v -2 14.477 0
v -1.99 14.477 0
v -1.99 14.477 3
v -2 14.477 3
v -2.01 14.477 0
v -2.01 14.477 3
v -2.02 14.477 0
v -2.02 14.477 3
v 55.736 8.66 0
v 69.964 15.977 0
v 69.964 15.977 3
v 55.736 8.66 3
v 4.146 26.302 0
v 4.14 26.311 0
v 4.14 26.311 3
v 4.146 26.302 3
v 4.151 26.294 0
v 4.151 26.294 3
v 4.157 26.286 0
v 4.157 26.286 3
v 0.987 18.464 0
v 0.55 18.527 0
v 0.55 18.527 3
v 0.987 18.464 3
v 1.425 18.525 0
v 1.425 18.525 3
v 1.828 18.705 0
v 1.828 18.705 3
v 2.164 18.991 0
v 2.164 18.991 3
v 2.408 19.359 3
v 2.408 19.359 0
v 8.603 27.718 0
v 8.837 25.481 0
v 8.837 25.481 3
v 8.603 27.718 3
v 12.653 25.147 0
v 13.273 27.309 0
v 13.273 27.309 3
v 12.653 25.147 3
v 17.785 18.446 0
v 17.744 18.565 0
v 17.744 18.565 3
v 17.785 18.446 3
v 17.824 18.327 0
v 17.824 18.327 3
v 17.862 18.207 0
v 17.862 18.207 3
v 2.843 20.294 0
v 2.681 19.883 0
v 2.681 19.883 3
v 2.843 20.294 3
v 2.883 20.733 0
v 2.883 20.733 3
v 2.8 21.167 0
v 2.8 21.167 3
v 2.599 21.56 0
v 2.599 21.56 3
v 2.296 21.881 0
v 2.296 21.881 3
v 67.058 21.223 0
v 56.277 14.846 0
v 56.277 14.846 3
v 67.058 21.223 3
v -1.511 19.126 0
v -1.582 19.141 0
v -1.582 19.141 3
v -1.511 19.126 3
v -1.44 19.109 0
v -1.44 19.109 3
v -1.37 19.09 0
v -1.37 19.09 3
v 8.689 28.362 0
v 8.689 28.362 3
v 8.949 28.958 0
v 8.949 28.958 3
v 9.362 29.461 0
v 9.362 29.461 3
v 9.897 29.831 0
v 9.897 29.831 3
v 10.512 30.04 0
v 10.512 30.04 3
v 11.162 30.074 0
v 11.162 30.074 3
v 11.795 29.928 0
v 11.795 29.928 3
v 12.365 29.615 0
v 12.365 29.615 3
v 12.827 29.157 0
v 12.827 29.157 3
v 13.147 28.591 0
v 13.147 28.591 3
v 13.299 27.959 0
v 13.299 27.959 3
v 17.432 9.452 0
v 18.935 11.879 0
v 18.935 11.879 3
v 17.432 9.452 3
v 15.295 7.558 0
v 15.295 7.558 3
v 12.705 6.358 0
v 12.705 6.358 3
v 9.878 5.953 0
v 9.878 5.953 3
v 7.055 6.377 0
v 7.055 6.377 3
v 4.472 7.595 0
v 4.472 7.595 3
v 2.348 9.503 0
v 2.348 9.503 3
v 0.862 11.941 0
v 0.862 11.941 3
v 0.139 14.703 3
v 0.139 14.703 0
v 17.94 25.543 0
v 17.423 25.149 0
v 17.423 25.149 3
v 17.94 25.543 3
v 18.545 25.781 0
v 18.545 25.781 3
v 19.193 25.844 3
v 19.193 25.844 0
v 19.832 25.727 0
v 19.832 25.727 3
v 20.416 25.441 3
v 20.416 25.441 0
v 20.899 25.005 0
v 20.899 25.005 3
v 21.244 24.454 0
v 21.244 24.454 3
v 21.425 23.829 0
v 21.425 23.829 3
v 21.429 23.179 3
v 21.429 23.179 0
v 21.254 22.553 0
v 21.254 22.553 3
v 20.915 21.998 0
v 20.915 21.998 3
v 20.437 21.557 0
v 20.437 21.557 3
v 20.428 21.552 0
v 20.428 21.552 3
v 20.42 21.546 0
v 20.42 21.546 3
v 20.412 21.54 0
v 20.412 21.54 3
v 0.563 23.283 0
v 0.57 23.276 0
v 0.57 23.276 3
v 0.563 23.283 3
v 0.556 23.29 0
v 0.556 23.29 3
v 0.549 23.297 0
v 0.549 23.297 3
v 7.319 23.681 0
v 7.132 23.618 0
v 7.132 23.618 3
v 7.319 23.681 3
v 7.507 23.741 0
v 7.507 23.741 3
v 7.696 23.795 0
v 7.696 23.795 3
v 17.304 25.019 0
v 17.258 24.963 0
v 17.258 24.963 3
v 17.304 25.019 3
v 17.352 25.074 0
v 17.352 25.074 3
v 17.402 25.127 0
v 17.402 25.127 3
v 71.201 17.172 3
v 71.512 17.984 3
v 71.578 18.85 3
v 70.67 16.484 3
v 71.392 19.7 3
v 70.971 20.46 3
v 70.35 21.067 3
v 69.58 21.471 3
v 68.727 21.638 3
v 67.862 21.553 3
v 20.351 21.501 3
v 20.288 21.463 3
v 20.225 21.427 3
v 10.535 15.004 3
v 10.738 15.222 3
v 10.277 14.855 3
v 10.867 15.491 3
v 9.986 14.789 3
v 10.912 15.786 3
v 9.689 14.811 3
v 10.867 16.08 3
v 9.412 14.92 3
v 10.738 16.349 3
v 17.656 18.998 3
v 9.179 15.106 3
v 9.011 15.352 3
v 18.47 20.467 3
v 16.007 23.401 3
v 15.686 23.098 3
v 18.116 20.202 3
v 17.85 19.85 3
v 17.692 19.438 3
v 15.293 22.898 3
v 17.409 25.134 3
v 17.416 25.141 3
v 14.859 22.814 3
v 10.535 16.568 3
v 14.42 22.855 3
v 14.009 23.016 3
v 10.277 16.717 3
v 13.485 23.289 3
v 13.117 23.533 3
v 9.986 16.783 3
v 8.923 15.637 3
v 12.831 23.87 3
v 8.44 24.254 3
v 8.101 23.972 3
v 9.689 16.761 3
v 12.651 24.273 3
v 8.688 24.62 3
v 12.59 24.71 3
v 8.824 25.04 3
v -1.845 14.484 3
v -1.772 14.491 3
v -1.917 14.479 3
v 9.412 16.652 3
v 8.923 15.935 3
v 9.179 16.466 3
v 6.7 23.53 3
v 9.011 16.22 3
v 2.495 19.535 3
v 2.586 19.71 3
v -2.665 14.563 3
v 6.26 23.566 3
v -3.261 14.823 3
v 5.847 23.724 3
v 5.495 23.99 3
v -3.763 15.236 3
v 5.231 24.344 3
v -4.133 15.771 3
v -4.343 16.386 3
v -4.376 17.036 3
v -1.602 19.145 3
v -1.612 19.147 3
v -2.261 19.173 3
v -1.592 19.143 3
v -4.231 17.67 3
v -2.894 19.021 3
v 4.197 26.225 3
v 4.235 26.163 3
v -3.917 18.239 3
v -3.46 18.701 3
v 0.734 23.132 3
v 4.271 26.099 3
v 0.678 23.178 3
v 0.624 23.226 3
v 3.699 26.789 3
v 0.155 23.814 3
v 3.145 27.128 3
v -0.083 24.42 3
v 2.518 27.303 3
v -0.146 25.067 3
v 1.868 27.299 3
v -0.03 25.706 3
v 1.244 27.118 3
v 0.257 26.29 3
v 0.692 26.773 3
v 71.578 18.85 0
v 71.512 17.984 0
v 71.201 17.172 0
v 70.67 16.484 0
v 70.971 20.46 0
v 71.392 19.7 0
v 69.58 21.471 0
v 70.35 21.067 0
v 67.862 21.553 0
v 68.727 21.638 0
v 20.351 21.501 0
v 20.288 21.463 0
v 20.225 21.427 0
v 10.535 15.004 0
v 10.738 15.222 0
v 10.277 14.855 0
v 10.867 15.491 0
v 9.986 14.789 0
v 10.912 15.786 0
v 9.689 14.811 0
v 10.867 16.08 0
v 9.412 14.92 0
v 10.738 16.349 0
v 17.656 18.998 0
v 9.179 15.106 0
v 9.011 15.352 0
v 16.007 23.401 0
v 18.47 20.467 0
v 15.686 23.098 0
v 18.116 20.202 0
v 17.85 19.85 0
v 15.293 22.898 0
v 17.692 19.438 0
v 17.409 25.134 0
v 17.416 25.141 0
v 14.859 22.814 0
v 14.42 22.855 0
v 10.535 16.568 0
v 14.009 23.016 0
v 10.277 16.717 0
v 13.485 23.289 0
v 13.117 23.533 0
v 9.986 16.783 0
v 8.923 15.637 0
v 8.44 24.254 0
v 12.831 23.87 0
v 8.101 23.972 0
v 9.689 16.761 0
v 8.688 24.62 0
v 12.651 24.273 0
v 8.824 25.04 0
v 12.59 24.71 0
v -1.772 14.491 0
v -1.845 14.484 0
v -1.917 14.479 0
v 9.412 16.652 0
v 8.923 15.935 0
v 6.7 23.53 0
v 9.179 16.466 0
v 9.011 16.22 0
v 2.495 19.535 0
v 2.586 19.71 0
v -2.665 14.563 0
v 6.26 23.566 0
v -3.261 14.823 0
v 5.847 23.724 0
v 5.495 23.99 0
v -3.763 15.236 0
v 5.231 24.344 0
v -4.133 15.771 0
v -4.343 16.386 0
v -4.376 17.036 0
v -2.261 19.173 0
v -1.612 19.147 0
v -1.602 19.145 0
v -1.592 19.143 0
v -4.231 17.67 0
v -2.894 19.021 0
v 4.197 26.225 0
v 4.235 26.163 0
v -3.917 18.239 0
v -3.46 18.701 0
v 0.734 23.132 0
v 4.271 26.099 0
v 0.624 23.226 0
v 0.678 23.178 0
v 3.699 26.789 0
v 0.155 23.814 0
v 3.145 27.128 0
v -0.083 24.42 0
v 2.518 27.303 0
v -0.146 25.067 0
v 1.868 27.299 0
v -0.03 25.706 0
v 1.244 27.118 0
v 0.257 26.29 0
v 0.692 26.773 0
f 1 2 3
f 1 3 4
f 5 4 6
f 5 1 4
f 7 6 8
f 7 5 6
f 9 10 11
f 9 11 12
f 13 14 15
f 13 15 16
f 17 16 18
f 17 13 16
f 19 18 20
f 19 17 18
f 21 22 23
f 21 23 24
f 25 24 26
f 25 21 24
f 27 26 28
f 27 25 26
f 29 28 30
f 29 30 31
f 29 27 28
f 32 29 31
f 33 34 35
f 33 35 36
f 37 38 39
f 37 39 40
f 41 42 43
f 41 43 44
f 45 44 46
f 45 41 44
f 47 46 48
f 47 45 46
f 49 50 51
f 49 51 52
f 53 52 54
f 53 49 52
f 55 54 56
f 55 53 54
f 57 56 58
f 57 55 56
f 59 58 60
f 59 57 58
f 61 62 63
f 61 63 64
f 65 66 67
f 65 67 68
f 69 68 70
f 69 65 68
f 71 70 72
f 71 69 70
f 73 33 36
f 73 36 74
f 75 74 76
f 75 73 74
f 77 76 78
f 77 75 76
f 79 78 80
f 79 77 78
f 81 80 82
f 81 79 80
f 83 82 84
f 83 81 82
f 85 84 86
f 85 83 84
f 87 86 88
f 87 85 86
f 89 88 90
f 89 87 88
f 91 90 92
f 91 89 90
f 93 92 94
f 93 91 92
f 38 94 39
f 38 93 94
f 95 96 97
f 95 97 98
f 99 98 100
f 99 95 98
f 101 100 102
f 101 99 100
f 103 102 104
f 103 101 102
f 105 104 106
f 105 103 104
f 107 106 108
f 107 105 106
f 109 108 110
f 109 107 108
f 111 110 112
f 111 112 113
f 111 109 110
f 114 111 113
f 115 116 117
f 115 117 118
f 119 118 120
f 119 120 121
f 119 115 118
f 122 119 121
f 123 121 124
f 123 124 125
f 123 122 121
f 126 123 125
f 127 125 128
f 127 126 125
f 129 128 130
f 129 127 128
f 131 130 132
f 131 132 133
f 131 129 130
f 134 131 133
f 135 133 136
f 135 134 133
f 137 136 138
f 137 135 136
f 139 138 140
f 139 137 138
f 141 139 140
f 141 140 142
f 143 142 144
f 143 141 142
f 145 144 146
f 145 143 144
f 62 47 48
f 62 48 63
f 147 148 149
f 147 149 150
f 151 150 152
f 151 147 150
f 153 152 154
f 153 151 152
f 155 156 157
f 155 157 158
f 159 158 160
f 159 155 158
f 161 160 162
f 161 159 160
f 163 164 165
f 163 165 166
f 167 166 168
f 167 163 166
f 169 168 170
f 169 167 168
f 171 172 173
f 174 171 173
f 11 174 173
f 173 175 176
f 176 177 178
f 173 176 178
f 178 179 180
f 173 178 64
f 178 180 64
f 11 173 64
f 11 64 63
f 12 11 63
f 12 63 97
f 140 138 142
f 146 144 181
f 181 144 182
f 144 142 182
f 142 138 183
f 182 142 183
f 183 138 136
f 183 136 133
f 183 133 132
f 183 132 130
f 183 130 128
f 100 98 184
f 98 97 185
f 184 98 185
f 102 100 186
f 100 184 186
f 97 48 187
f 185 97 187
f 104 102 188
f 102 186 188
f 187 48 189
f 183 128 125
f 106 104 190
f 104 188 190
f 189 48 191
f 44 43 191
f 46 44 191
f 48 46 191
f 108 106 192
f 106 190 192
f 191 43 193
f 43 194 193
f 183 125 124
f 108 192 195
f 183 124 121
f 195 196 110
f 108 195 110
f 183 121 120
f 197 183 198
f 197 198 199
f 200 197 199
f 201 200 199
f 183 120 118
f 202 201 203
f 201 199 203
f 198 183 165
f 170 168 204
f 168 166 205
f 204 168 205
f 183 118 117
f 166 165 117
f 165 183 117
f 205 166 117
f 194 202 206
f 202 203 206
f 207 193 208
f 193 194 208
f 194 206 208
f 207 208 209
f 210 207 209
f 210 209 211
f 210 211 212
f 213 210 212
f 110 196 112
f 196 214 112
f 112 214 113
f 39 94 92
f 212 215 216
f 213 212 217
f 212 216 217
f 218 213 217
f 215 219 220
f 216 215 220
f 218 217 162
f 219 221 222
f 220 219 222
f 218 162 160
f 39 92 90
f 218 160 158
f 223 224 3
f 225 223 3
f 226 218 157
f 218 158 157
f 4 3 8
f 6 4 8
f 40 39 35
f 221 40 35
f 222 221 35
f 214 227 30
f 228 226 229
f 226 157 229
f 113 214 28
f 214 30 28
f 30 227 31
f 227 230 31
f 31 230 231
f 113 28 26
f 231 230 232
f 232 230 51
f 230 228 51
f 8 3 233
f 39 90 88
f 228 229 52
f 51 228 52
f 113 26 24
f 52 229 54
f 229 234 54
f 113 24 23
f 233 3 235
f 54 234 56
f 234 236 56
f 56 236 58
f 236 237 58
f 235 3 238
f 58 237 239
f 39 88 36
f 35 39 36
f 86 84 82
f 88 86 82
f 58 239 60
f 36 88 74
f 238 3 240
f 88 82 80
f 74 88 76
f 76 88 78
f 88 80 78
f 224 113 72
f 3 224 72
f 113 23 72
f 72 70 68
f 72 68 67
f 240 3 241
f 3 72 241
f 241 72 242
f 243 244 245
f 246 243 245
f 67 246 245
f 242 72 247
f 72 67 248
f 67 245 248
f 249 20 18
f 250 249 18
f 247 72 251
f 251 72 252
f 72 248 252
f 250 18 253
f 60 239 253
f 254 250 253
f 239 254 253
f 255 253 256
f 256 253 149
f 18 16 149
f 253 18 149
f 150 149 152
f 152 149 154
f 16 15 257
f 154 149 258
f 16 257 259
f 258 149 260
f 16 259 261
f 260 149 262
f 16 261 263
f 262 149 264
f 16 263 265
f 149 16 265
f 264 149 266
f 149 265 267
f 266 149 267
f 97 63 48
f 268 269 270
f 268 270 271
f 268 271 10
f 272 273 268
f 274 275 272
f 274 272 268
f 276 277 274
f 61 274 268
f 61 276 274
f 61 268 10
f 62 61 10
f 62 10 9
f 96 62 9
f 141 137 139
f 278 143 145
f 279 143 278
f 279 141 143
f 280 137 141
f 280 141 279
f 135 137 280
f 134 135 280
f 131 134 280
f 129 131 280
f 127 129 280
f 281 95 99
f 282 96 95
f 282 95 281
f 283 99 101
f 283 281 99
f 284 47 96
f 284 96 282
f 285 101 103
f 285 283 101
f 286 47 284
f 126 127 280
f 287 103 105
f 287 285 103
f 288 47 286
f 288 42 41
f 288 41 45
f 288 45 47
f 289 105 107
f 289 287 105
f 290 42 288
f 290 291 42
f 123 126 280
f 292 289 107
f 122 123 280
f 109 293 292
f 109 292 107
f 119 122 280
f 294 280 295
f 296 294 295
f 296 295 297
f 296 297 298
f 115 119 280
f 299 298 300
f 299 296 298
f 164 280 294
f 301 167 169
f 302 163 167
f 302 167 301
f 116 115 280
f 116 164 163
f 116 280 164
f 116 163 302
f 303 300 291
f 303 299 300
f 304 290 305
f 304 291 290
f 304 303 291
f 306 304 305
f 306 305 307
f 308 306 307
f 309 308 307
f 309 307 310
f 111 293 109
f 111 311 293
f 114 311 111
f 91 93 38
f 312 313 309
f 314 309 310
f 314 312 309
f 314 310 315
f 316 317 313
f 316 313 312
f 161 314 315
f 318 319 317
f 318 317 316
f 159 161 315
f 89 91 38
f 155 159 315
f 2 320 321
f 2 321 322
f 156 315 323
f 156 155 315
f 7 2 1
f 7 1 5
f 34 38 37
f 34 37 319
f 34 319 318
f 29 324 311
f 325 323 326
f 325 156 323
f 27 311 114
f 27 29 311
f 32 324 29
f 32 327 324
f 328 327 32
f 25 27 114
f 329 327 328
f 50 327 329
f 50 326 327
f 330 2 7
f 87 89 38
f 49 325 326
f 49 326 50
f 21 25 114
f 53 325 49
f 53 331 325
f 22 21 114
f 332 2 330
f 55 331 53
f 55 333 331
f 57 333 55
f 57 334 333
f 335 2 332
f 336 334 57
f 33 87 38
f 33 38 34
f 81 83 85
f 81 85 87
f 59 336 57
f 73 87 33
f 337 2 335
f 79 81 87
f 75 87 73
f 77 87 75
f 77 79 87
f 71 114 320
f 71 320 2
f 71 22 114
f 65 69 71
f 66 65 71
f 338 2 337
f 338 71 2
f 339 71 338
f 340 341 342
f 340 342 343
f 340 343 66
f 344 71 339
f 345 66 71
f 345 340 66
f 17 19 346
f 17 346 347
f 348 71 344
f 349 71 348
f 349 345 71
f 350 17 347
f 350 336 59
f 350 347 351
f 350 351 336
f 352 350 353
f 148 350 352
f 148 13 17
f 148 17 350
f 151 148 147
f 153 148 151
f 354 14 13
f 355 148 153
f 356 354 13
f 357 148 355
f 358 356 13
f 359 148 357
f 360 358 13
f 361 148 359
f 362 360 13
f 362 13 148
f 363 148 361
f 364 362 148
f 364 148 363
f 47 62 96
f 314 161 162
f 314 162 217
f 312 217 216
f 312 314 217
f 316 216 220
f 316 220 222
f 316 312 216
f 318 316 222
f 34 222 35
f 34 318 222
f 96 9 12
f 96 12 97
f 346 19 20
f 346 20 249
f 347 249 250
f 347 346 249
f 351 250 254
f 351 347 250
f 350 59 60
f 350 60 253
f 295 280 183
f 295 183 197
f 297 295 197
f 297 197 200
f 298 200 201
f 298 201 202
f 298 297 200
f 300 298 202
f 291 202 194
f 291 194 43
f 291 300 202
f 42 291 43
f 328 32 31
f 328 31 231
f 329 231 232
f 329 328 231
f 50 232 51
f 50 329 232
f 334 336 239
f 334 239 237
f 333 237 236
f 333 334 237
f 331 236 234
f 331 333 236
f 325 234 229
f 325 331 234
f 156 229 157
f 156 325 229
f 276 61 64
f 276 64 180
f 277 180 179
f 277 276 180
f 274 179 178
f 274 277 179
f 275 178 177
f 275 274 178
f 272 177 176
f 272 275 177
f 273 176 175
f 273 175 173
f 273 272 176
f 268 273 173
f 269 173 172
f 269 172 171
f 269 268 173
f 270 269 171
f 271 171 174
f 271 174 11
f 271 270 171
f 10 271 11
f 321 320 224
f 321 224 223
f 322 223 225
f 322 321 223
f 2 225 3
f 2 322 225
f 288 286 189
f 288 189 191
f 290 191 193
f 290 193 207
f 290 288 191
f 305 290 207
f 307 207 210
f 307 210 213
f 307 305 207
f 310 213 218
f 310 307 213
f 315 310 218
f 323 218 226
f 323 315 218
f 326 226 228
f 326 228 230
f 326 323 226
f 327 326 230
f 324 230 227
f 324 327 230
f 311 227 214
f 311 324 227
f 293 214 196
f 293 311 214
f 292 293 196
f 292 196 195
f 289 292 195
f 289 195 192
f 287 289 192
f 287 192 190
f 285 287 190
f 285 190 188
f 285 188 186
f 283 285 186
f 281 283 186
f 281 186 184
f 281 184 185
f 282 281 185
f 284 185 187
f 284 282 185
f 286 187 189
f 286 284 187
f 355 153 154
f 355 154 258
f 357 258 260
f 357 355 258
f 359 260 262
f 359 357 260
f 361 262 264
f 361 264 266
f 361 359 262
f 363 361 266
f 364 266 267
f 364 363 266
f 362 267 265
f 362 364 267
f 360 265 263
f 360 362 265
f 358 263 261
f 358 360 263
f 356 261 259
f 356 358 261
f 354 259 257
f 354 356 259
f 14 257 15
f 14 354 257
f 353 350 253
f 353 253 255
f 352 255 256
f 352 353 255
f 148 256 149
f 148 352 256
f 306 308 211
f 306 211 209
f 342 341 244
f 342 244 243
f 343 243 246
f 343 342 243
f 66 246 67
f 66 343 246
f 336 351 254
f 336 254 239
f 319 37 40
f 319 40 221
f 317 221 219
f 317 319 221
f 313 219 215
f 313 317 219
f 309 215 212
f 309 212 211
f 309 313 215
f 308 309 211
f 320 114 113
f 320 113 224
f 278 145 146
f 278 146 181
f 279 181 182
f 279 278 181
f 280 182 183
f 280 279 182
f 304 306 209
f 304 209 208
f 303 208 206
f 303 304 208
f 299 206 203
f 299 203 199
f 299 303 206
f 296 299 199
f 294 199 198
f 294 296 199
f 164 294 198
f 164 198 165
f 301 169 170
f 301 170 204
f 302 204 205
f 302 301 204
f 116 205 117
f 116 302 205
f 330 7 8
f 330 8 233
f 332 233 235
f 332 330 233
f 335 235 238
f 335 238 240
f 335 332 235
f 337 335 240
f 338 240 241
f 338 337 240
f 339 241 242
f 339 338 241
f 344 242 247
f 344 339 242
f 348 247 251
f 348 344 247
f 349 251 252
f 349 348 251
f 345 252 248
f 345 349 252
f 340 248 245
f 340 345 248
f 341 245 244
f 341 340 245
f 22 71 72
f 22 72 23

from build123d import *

# Parameters (mm, degrees)
MODEL_R                 = 1
SALIENTE_EXTRUIR1_DEPTH = 3


with BuildPart() as part:
    # Model → Saliente-Extruir1 (new body)
    with BuildSketch(Plane.XY):
        with BuildLine():
            Line((17.861622063, 18.20706488), (56.277425925, 14.846117598))
            Line((56.277425925, 14.846117598), (67.057874252, 21.223257456))
            ThreePointArc((67.057874252, 21.223257456), (71.209474737, 20.095027087), (69.964368376, 15.976969231))
            Line((69.964368376, 15.976969231), (55.736188762, 8.659748523))
            Line((55.736188762, 8.659748523), (18.934882774, 11.8794456))
            ThreePointArc((18.934882774, 11.8794456), (8.451096418, 6.06231898), (0.138961898, 14.702756365))
            Line((0.138961898, 14.702756365), (-1.772059081, 14.490982222))
            ThreePointArc((-1.772059081, 14.490982222), (-1.880981546, 14.481466547), (-1.990228383, 14.477019049))
            ThreePointArc((-1.990228383, 14.477019049), (-2.005285406, 14.476804272), (-2.020343495, 14.476685822))
            ThreePointArc((-2.020343495, 14.476685822), (-4.376324998, 17.035772608), (-1.611755391, 19.146869222))
            ThreePointArc((-1.611755391, 19.146869222), (-1.596946637, 19.144137761), (-1.582155659, 19.141311623))
            ThreePointArc((-1.582155659, 19.141311623), (-1.475340827, 19.117961178), (-1.369725519, 19.08967588))
            Line((-1.369725519, 19.08967588), (0.550429384, 18.527326068))
            ThreePointArc((0.550429384, 18.527326068), (1.632460158, 18.600931479), (2.408362946, 19.35868026))
            ThreePointArc((2.408362946, 19.35868026), (2.540100184, 19.623117729), (2.6811533, 19.882705658))
            ThreePointArc((2.6811533, 19.882705658), (2.856825208, 20.952914859), (2.296491875, 21.881480908))
            Line((2.296491875, 21.881480908), (0.734486272, 23.131829117))
            ThreePointArc((0.734486272, 23.131829117), (0.65073786, 23.202120333), (0.570343825, 23.276224656))
            ThreePointArc((0.570343825, 23.276224656), (0.559545032, 23.286719709), (0.548813598, 23.297283629))
            ThreePointArc((0.548813598, 23.297283629), (0.692430721, 26.772761747), (4.140047368, 26.310686561))
            ThreePointArc((4.140047368, 26.310686561), (4.148587304, 26.298283756), (4.157047724, 26.285826574))
            ThreePointArc((4.157047724, 26.285826574), (4.216065957, 26.193785825), (4.270746533, 26.099103798))
            Line((4.270746533, 26.099103798), (5.230859716, 24.343707882))
            ThreePointArc((5.230859716, 24.343707882), (6.048017899, 23.630643468), (7.132473325, 23.617806645))
            ThreePointArc((7.132473325, 23.617806645), (7.412611146, 23.711639877), (7.695907146, 23.795456646))
            ThreePointArc((7.695907146, 23.795456646), (8.576878126, 24.427990033), (8.837257977, 25.480800883))
            Line((8.837257977, 25.480800883), (8.602586519, 27.717719751))
            ThreePointArc((8.602586519, 27.717719751), (11.161673306, 30.073701254), (13.272769919, 27.309131647))
            Line((13.272769919, 27.309131647), (12.653226766, 25.146946875))
            ThreePointArc((12.653226766, 25.146946875), (12.726832176, 24.064916101), (13.484580957, 23.289013313))
            Line((13.484580957, 23.289013313), (14.008606355, 23.016222959))
            ThreePointArc((14.008606355, 23.016222959), (15.078815556, 22.840551052), (16.007381606, 23.400884385))
            Line((16.007381606, 23.400884385), (17.257729815, 24.962889987))
            ThreePointArc((17.257729815, 24.962889987), (17.328021031, 25.046638399), (17.402125353, 25.127032434))
            ThreePointArc((17.402125353, 25.127032434), (17.412620407, 25.137831227), (17.423184327, 25.148562661))
            ThreePointArc((17.423184327, 25.148562661), (20.898662444, 25.004945538), (20.436587259, 21.557328891))
            ThreePointArc((20.436587259, 21.557328891), (20.424184454, 21.548788955), (20.411727272, 21.540328535))
            ThreePointArc((20.411727272, 21.540328535), (20.319686522, 21.481310302), (20.225004495, 21.426629727))
            Line((20.225004495, 21.426629727), (18.46960858, 20.466516543))
            ThreePointArc((18.46960858, 20.466516543), (17.756544167, 19.64935836), (17.743707345, 18.564902935))
            ThreePointArc((17.743707345, 18.564902935), (17.804692888, 18.386652235), (17.861622063, 18.20706488))
        make_face()
        with Locations((9.911638477, 15.785737779)):
            Circle(MODEL_R, mode=Mode.SUBTRACT)
    extrude(amount=SALIENTE_EXTRUIR1_DEPTH)


solid = part.part
